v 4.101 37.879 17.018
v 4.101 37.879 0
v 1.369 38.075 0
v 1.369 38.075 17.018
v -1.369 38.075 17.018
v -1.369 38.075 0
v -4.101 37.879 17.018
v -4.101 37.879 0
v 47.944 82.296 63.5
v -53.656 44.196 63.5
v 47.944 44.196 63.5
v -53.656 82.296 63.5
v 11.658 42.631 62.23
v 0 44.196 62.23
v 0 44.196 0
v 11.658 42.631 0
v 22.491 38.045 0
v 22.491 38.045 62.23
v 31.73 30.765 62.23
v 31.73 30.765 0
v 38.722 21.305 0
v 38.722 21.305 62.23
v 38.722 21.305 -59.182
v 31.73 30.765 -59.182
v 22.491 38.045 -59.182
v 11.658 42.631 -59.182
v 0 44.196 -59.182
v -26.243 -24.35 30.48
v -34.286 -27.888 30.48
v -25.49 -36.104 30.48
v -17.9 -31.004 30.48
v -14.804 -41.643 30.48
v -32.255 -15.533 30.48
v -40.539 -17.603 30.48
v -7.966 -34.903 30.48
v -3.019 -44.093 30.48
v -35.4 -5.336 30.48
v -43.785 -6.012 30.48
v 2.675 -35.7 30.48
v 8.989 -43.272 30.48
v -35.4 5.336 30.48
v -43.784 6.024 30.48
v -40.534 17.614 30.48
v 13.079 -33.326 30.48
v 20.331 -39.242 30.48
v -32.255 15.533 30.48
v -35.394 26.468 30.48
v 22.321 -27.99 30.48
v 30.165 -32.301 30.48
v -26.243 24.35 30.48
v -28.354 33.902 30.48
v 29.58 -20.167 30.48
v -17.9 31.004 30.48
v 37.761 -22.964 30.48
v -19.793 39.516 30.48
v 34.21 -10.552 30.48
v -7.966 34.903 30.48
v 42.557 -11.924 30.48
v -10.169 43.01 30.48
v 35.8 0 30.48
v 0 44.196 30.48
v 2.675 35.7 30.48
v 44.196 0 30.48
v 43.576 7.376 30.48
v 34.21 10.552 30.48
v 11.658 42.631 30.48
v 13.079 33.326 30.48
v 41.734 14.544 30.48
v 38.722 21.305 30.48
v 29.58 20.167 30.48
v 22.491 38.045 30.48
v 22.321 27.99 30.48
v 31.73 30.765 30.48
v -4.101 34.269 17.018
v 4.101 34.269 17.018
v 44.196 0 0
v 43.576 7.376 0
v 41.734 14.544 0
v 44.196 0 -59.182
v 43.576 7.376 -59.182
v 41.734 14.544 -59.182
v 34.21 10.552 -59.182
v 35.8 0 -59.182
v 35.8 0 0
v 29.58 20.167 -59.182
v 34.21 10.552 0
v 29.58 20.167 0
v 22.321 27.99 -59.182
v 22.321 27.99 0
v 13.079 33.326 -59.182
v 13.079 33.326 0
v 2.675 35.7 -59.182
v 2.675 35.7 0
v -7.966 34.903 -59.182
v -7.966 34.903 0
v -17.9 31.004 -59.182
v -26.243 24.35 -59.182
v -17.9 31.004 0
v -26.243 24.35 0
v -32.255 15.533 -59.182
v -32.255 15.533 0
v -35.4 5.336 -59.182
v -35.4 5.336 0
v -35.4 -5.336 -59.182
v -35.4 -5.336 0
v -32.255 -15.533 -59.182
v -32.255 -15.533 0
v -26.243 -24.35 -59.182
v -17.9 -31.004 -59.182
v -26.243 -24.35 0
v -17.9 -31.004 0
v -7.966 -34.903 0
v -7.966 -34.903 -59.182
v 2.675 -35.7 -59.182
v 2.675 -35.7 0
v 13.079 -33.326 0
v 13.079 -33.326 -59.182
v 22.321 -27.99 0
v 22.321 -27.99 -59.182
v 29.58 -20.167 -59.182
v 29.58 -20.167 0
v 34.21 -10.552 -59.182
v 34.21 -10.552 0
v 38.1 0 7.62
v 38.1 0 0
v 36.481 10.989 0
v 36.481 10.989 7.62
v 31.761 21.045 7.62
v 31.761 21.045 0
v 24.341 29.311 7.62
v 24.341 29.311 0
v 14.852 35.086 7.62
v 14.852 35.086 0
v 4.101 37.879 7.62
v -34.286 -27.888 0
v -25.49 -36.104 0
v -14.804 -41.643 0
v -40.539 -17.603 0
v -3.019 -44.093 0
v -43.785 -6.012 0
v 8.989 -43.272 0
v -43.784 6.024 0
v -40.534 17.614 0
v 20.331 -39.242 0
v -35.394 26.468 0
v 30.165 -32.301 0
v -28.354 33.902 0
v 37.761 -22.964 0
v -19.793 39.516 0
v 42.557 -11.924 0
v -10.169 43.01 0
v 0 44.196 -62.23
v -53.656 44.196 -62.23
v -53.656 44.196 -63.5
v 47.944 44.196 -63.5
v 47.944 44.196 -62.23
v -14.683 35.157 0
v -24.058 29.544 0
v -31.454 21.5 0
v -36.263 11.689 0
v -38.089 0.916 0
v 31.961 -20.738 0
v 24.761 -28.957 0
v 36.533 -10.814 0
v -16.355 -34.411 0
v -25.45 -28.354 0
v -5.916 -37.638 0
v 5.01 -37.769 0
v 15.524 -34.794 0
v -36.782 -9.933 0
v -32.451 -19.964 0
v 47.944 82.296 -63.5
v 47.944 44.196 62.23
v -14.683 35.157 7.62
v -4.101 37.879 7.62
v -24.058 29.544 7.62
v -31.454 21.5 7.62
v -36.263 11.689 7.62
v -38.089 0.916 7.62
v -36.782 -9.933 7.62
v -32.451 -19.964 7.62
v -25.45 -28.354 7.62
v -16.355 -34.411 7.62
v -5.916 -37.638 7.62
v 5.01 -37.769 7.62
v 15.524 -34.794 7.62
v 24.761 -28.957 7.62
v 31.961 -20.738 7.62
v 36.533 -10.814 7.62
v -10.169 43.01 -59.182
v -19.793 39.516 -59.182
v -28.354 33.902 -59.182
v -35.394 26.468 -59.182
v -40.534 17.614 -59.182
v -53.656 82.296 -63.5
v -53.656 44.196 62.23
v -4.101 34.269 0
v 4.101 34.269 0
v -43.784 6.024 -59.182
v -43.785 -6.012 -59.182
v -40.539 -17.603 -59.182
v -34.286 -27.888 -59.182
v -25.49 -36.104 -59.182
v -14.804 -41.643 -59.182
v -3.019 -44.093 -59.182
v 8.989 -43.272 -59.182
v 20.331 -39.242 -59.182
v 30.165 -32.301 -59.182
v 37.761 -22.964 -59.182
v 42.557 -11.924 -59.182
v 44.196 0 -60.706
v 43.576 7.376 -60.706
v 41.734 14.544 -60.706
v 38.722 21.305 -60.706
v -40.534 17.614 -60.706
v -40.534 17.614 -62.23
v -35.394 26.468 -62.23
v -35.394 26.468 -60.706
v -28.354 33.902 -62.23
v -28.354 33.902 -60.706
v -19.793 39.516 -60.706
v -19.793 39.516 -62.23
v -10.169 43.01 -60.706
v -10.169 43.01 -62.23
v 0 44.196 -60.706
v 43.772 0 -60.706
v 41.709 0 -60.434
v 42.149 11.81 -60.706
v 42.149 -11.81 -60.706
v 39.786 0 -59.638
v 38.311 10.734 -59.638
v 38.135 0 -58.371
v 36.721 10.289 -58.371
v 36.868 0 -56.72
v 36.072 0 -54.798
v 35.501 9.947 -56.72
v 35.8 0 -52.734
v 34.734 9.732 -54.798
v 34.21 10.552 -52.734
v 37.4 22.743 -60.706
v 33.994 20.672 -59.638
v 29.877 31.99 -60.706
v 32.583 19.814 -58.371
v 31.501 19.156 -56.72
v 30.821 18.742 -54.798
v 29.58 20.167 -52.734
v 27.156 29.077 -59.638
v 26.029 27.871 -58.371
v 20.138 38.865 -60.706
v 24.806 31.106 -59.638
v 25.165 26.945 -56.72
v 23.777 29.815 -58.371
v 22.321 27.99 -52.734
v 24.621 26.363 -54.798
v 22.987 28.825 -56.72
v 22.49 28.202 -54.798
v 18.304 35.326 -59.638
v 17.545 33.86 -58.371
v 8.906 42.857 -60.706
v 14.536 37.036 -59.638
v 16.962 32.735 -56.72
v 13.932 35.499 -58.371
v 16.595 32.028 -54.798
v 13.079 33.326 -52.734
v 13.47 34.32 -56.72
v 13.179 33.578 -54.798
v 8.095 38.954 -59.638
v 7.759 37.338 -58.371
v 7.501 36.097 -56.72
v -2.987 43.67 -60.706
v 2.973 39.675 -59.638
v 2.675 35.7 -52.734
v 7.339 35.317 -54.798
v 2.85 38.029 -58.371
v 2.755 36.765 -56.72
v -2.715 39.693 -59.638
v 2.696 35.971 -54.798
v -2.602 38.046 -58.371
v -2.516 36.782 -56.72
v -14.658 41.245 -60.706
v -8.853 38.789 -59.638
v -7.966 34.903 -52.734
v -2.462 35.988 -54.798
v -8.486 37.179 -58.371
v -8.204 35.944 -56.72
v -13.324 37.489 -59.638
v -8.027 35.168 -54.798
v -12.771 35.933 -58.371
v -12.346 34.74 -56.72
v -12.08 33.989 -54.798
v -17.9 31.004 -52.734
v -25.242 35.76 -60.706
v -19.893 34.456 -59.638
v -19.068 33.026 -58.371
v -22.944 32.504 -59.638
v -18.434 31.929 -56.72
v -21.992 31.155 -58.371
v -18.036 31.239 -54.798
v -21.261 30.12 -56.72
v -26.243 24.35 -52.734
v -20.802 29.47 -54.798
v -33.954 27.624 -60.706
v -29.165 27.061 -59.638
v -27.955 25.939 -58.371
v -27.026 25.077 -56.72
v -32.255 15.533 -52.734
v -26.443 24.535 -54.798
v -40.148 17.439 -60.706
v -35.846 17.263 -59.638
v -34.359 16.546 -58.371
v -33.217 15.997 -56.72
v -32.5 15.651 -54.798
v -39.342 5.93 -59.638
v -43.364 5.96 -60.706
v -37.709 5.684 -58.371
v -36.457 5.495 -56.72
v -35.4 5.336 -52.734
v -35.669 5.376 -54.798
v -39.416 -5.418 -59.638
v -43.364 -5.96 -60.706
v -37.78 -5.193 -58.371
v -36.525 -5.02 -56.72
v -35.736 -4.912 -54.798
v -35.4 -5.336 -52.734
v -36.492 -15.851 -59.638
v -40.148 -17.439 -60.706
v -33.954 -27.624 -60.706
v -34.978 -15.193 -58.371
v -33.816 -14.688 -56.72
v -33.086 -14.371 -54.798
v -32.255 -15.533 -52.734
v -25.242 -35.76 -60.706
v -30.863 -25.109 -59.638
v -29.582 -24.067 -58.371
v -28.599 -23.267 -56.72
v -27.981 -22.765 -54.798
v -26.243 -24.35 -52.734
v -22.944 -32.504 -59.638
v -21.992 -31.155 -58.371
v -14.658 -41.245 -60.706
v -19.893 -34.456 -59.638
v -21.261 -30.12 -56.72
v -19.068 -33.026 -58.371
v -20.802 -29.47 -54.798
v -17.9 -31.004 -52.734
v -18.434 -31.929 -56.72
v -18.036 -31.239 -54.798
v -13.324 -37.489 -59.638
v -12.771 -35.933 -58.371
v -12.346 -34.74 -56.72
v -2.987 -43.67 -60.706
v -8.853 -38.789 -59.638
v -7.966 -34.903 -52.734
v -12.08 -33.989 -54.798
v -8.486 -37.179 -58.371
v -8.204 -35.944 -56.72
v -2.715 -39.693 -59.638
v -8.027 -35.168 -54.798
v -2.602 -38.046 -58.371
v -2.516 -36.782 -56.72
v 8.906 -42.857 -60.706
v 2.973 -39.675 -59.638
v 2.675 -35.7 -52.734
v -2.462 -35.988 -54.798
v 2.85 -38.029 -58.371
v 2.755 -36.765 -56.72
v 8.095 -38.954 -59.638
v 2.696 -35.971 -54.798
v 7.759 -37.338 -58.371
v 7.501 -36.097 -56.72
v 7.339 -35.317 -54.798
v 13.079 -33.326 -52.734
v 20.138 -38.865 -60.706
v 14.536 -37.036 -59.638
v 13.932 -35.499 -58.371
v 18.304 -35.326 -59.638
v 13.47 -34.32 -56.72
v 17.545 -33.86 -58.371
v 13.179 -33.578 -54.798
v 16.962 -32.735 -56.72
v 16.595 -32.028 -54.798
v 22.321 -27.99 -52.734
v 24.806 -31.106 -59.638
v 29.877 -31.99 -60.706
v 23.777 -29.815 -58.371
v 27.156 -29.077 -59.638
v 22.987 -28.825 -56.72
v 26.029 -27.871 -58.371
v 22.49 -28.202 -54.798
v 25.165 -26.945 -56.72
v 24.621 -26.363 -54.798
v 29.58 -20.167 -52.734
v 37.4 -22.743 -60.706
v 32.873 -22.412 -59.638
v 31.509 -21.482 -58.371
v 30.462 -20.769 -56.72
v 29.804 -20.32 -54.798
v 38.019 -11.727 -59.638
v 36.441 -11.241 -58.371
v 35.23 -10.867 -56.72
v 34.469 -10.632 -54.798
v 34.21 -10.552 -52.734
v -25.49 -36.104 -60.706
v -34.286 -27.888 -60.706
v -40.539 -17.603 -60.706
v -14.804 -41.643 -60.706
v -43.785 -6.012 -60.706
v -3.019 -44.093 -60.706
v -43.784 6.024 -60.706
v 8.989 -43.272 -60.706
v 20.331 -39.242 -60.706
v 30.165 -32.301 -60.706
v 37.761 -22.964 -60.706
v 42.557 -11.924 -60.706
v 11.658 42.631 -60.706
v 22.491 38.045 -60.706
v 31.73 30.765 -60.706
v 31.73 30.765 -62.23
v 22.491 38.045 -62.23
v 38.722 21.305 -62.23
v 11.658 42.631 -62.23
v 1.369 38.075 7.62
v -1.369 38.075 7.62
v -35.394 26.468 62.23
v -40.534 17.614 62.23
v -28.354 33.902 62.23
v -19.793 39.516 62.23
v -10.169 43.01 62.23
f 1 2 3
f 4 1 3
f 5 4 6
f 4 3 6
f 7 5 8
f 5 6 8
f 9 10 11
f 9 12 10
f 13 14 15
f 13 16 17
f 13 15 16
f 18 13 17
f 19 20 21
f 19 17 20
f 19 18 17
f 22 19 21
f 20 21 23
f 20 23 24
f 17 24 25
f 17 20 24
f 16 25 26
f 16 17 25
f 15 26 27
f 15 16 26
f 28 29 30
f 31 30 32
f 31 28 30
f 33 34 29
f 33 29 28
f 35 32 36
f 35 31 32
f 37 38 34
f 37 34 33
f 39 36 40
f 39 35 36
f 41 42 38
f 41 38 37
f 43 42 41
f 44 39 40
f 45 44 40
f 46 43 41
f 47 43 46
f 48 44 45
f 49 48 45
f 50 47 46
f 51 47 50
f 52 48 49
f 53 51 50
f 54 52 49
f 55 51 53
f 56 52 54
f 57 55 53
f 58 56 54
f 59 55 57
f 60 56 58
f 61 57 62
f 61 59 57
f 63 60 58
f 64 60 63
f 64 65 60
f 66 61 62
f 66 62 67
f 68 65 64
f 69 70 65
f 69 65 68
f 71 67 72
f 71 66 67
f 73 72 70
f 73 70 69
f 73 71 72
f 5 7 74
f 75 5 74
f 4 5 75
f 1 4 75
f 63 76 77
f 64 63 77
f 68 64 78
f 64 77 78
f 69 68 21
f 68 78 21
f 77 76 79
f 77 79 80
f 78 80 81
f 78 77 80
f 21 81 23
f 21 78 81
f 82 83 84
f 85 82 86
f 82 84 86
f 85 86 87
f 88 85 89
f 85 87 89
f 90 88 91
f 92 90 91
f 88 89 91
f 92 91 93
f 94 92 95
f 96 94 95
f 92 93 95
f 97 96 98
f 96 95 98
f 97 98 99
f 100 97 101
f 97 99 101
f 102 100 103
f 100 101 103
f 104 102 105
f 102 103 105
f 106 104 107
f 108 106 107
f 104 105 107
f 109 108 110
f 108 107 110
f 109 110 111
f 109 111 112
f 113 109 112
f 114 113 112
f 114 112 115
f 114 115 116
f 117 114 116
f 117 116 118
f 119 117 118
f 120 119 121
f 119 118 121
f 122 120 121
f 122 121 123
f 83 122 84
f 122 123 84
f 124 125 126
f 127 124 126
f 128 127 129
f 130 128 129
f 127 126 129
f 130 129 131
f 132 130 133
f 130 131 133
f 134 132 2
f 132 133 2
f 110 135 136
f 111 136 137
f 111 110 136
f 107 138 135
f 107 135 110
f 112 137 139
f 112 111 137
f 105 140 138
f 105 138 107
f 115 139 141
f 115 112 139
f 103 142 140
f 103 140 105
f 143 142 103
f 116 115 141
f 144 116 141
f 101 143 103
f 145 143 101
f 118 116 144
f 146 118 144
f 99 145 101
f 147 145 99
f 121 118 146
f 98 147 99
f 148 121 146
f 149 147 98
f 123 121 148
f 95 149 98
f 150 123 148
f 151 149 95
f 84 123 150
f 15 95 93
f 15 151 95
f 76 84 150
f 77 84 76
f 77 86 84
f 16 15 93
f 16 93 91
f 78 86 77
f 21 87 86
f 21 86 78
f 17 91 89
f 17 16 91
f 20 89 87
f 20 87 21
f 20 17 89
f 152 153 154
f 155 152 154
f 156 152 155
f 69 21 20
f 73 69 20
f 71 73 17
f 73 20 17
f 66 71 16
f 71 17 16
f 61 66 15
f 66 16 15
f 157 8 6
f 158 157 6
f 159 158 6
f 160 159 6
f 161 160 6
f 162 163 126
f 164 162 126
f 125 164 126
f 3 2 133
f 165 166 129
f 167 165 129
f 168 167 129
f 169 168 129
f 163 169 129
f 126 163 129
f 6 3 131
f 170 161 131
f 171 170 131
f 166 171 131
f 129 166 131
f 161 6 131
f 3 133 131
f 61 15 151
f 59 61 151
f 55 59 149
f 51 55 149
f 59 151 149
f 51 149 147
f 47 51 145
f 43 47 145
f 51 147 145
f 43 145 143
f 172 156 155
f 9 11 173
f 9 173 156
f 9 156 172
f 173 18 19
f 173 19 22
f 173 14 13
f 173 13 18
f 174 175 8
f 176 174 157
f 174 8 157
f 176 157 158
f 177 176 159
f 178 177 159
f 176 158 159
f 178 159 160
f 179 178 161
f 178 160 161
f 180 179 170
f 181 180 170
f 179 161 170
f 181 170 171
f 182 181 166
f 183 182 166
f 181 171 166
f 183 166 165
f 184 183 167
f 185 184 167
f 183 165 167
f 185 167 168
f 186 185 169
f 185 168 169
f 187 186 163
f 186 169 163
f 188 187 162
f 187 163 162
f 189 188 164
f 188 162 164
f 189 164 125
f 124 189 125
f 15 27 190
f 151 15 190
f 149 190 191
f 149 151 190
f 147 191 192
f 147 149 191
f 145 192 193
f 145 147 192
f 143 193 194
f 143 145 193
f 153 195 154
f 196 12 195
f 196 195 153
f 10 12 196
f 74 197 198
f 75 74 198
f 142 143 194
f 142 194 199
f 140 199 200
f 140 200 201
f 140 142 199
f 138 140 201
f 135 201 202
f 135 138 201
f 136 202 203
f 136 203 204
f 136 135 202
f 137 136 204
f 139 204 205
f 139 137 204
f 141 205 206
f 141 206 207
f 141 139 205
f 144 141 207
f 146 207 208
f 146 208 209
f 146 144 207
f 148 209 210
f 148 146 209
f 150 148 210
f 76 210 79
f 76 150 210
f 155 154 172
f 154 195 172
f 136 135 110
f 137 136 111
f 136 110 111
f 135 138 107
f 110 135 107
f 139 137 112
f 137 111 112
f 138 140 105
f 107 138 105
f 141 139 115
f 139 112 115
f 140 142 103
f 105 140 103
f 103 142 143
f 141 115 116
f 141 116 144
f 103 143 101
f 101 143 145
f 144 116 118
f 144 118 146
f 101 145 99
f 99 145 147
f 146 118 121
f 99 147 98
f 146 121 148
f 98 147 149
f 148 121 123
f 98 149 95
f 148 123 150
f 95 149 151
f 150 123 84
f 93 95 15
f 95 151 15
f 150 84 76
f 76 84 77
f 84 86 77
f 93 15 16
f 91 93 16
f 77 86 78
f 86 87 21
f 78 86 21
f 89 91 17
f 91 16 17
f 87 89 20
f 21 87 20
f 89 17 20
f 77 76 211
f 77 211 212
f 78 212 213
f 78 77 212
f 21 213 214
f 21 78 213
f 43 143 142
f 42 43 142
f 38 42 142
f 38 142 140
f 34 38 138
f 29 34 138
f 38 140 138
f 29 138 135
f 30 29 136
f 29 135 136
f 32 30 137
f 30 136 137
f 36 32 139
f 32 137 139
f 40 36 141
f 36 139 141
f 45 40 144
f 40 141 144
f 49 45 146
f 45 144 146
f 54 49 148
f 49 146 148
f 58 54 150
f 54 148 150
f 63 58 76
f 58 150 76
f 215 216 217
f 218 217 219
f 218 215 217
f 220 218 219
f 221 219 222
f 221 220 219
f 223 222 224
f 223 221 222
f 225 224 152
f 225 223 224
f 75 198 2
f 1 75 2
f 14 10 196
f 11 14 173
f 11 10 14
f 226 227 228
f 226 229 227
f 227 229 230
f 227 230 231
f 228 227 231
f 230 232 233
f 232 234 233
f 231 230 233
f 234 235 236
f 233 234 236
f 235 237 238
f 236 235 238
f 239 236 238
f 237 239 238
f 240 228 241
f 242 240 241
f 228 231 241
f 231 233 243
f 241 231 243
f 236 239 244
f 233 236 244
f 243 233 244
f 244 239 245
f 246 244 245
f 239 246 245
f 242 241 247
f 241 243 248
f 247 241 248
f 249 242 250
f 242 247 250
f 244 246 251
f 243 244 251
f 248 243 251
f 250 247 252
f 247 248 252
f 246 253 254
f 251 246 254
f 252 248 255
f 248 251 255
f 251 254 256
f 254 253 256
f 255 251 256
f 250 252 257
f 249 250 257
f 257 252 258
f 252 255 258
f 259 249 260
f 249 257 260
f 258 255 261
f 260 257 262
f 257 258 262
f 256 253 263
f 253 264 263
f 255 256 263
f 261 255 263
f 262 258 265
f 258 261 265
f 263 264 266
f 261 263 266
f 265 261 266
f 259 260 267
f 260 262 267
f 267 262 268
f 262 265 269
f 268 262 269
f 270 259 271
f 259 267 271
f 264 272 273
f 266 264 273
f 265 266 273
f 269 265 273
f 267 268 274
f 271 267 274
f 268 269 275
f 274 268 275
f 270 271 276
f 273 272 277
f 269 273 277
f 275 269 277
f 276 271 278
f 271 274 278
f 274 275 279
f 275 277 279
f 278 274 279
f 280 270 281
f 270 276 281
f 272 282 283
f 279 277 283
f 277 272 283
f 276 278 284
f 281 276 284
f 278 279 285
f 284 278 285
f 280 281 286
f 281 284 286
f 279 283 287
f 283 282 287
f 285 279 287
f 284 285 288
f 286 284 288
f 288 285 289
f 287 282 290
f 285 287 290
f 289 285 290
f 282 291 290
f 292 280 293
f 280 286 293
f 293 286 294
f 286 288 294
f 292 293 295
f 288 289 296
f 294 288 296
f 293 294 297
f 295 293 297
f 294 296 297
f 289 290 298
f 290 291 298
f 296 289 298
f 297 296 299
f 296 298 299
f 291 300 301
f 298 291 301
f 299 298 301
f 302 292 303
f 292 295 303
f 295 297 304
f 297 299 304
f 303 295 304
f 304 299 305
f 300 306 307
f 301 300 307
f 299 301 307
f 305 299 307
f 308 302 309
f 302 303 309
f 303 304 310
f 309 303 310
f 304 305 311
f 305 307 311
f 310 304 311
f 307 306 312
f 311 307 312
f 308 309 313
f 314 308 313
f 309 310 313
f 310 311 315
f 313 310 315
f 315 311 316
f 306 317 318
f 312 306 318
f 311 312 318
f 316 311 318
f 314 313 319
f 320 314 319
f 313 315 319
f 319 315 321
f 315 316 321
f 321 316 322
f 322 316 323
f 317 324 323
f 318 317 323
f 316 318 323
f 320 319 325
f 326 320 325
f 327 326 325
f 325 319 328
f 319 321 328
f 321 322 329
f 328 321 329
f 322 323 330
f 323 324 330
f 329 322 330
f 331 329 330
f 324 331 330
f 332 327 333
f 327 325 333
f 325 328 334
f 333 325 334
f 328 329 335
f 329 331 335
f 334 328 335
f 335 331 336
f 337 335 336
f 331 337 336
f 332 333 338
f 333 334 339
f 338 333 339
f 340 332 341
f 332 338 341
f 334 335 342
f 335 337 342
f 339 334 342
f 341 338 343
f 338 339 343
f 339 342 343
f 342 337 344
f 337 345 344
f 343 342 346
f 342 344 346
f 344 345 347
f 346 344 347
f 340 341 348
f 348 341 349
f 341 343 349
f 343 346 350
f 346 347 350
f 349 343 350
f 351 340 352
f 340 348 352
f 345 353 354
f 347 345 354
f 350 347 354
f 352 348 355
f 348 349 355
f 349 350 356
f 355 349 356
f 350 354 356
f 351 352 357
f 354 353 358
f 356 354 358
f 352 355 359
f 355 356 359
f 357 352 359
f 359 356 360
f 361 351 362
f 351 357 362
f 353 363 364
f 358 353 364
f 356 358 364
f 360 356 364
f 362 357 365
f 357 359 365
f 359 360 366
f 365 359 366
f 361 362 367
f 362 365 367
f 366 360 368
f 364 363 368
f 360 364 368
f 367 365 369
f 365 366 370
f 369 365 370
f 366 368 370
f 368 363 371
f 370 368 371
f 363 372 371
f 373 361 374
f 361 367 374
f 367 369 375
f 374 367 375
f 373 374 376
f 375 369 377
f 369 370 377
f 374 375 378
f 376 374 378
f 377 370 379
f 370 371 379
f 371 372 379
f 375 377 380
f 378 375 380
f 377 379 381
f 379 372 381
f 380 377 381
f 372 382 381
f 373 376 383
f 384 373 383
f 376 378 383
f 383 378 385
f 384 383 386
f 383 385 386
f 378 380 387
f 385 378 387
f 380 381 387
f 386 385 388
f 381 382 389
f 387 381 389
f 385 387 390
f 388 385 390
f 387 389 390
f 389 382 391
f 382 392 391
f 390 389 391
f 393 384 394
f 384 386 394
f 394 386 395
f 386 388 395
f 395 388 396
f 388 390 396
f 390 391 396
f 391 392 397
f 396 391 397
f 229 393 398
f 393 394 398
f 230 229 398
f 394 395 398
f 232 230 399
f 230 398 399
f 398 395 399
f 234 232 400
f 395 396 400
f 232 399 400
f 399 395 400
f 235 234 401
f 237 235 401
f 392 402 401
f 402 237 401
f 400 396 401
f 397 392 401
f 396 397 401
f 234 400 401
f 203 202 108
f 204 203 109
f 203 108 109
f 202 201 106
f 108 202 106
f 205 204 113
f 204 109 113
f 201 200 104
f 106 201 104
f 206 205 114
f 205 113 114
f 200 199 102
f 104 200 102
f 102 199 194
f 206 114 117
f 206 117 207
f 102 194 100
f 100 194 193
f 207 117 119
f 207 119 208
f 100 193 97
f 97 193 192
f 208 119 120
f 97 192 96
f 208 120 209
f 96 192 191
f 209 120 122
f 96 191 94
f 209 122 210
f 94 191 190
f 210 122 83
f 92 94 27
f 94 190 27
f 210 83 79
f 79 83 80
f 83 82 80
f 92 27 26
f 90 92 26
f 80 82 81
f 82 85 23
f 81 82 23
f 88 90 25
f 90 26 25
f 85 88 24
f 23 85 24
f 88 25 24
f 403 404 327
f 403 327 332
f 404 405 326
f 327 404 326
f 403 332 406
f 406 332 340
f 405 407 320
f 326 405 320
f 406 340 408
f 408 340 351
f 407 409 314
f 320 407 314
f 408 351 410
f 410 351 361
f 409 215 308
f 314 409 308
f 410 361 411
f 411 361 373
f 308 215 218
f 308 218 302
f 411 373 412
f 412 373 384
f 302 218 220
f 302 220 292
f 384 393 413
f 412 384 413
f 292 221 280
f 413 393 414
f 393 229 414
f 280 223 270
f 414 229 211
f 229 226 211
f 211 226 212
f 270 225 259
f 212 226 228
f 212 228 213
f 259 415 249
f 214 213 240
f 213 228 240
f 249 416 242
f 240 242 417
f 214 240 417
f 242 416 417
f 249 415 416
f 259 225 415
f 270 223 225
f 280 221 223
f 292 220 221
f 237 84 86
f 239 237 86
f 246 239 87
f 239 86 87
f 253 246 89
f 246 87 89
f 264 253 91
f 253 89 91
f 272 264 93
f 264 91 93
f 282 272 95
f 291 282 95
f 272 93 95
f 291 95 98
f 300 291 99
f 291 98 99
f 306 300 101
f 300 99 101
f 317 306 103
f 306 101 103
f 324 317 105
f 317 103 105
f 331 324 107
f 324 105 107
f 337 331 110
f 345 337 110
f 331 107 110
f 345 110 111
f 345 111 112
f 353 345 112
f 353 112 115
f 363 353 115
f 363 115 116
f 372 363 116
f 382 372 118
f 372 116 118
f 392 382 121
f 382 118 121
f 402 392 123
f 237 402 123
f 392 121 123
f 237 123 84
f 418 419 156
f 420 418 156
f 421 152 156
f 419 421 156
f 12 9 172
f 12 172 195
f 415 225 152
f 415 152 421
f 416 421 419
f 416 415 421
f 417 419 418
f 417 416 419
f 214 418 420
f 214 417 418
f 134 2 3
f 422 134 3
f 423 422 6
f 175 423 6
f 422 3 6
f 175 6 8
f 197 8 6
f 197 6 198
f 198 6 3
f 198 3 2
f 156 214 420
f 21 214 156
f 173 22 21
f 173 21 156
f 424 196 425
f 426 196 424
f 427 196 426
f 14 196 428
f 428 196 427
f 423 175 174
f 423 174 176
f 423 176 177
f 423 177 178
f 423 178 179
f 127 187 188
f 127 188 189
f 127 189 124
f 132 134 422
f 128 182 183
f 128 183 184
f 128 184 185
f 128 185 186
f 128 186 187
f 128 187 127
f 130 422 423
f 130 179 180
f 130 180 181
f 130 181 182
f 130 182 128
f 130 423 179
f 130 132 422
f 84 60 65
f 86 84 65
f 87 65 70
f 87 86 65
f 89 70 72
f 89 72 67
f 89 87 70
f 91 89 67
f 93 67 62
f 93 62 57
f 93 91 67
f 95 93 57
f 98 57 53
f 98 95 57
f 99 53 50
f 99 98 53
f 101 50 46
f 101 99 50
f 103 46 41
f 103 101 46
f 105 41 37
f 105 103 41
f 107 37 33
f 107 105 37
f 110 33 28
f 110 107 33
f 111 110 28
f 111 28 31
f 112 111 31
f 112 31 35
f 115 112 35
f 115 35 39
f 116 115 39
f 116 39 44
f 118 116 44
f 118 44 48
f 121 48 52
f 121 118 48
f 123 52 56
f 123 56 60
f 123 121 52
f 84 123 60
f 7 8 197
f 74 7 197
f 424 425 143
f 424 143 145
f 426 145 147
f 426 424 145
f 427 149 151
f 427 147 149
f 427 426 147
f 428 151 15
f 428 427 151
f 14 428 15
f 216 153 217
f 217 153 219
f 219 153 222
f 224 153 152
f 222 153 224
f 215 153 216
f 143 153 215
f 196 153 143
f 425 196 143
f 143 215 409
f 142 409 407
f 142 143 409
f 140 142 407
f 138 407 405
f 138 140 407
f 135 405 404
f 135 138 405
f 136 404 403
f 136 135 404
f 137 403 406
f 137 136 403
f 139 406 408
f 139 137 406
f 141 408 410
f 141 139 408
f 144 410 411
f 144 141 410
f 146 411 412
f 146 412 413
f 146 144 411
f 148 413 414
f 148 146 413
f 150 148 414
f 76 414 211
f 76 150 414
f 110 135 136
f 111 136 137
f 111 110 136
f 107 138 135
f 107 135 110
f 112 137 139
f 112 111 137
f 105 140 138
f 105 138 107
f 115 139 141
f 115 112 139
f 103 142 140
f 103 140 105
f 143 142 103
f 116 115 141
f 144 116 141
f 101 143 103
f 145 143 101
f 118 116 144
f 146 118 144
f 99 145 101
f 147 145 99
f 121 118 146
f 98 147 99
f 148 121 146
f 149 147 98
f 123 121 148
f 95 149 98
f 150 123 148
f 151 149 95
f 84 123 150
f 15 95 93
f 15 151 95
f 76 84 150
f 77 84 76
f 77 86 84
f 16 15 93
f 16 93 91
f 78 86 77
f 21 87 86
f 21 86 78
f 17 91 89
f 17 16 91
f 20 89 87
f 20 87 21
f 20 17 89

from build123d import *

# Parameters (mm, degrees)
F1_DEPTH = 63.5
F2_DEPTH = 62.23
F0_R     = 35.8003270569
F3_DEPTH = 60.706
F4_R     = 7.971733183
F6_DEPTH = 7.62
F7_DEPTH = 17.018
F8_DEPTH = 30.48
F9_DEPTH = 59.182


with BuildPart() as f1:
    # F0 (on Top) → F1 (new body, symmetric)
    with BuildSketch(Plane.XY):
        Polygon((-53.6557241526, 44.196), (0, 44.196), (47.9442758474, 44.196), (47.9442758474, 82.296), (-53.6557241526, 82.296), align=None)
    extrude(amount=F1_DEPTH, both=True)

    # F0 (on Top) → F2 (join, symmetric)
    with BuildSketch(Plane.XY):
        with BuildLine():
            Line((-53.6557241526, 44.196), (-40.5343907854, 17.6139030216))
            ThreePointArc((-40.5343907854, 17.6139030216), (-24.2365669811, 36.9577493494), (0, 44.196))
            Line((0, 44.196), (-53.6557241526, 44.196))
        make_face()
        with BuildLine():
            ThreePointArc((0, 44.196), (22.4909250619, 38.0452980782), (38.7217824253, 21.3051632664))
            Line((38.7217824253, 21.3051632664), (47.9442758474, 44.196))
            Line((47.9442758474, 44.196), (0, 44.196))
        make_face()
    extrude(amount=F2_DEPTH, both=True)

    # F0 (on Top) → F3 (join)
    with BuildSketch(Plane.XY):
        with BuildLine():
            ThreePointArc((-40.5343907854, 17.6139030216), (-8.9952343173, -43.2709160473), (44.196, 0))
            ThreePointArc((44.196, 0), (42.8055738898, 10.998602637), (38.7217824253, 21.3051632664))
            ThreePointArc((38.7217824253, 21.3051632664), (22.4909250619, 38.0452980782), (0, 44.196))
            ThreePointArc((0, 44.196), (-24.2365669811, 36.9577493494), (-40.5343907854, 17.6139030216))
        make_face()
        Circle(F0_R, mode=Mode.SUBTRACT)
    extrude(amount=-F3_DEPTH)

    # F4
    f4_edges = [f1.edges().sort_by_distance(p)[0] for p in [
        (-35.800327, 0, -60.706),
    ]]
    fillet(f4_edges, radius=F4_R)


with BuildPart() as f6:
    # F5 (on Top) → F6 (new body)
    with BuildSketch(Plane.XY):
        with BuildLine():
            Line((4.1009361986, 34.2692360282), (4.1009361986, 37.8786525935))
            ThreePointArc((4.1009361986, 37.8786525935), (0, 38.1), (-4.1009361986, 37.8786525935))
            Line((-4.1009361986, 37.8786525935), (-4.1009361986, 34.2692360282))
            Line((-4.1009361986, 34.2692360282), (4.1009361986, 34.2692360282))
        make_face()
        with BuildLine():
            ThreePointArc((-4.1009361986, 37.8786525935), (-25.4496004962, -28.3536211899), (38.1, 0))
            ThreePointArc((38.1, 0), (28.3536211899, 25.4496004962), (4.1009361986, 37.8786525935))
            Line((4.1009361986, 37.8786525935), (4.1009361986, 34.2692360282))
            Line((4.1009361986, 34.2692360282), (-4.1009361986, 34.2692360282))
            Line((-4.1009361986, 34.2692360282), (-4.1009361986, 37.8786525935))
        make_face()
    extrude(amount=F6_DEPTH)


with BuildPart() as f7:
    # F5 (on Top) → F7 (new body)
    with BuildSketch(Plane.XY):
        with BuildLine():
            Line((4.1009361986, 34.2692360282), (4.1009361986, 37.8786525935))
            ThreePointArc((4.1009361986, 37.8786525935), (0, 38.1), (-4.1009361986, 37.8786525935))
            Line((-4.1009361986, 37.8786525935), (-4.1009361986, 34.2692360282))
            Line((-4.1009361986, 34.2692360282), (4.1009361986, 34.2692360282))
        make_face()
    extrude(amount=F7_DEPTH)


with BuildPart() as f8:
    # F0 (on Top) → F8 (new body)
    with BuildSketch(Plane.XY):
        with BuildLine():
            ThreePointArc((-40.5343907854, 17.6139030216), (-8.9952343173, -43.2709160473), (44.196, 0))
            ThreePointArc((44.196, 0), (42.8055738898, 10.998602637), (38.7217824253, 21.3051632664))
            ThreePointArc((38.7217824253, 21.3051632664), (22.4909250619, 38.0452980782), (0, 44.196))
            ThreePointArc((0, 44.196), (-24.2365669811, 36.9577493494), (-40.5343907854, 17.6139030216))
        make_face()
        Circle(F0_R, mode=Mode.SUBTRACT)
    extrude(amount=F8_DEPTH)


with BuildPart() as f9:
    # F0 (on Top) → F9 (new body)
    with BuildSketch(Plane.XY):
        with BuildLine():
            ThreePointArc((-40.5343907854, 17.6139030216), (-8.9952343173, -43.2709160473), (44.196, 0))
            ThreePointArc((44.196, 0), (42.8055738898, 10.998602637), (38.7217824253, 21.3051632664))
            ThreePointArc((38.7217824253, 21.3051632664), (22.4909250619, 38.0452980782), (0, 44.196))
            ThreePointArc((0, 44.196), (-24.2365669811, 36.9577493494), (-40.5343907854, 17.6139030216))
        make_face()
        Circle(F0_R, mode=Mode.SUBTRACT)
    extrude(amount=-F9_DEPTH)


solid = Compound([f1.part, f6.part, f7.part, f8.part, f9.part])
